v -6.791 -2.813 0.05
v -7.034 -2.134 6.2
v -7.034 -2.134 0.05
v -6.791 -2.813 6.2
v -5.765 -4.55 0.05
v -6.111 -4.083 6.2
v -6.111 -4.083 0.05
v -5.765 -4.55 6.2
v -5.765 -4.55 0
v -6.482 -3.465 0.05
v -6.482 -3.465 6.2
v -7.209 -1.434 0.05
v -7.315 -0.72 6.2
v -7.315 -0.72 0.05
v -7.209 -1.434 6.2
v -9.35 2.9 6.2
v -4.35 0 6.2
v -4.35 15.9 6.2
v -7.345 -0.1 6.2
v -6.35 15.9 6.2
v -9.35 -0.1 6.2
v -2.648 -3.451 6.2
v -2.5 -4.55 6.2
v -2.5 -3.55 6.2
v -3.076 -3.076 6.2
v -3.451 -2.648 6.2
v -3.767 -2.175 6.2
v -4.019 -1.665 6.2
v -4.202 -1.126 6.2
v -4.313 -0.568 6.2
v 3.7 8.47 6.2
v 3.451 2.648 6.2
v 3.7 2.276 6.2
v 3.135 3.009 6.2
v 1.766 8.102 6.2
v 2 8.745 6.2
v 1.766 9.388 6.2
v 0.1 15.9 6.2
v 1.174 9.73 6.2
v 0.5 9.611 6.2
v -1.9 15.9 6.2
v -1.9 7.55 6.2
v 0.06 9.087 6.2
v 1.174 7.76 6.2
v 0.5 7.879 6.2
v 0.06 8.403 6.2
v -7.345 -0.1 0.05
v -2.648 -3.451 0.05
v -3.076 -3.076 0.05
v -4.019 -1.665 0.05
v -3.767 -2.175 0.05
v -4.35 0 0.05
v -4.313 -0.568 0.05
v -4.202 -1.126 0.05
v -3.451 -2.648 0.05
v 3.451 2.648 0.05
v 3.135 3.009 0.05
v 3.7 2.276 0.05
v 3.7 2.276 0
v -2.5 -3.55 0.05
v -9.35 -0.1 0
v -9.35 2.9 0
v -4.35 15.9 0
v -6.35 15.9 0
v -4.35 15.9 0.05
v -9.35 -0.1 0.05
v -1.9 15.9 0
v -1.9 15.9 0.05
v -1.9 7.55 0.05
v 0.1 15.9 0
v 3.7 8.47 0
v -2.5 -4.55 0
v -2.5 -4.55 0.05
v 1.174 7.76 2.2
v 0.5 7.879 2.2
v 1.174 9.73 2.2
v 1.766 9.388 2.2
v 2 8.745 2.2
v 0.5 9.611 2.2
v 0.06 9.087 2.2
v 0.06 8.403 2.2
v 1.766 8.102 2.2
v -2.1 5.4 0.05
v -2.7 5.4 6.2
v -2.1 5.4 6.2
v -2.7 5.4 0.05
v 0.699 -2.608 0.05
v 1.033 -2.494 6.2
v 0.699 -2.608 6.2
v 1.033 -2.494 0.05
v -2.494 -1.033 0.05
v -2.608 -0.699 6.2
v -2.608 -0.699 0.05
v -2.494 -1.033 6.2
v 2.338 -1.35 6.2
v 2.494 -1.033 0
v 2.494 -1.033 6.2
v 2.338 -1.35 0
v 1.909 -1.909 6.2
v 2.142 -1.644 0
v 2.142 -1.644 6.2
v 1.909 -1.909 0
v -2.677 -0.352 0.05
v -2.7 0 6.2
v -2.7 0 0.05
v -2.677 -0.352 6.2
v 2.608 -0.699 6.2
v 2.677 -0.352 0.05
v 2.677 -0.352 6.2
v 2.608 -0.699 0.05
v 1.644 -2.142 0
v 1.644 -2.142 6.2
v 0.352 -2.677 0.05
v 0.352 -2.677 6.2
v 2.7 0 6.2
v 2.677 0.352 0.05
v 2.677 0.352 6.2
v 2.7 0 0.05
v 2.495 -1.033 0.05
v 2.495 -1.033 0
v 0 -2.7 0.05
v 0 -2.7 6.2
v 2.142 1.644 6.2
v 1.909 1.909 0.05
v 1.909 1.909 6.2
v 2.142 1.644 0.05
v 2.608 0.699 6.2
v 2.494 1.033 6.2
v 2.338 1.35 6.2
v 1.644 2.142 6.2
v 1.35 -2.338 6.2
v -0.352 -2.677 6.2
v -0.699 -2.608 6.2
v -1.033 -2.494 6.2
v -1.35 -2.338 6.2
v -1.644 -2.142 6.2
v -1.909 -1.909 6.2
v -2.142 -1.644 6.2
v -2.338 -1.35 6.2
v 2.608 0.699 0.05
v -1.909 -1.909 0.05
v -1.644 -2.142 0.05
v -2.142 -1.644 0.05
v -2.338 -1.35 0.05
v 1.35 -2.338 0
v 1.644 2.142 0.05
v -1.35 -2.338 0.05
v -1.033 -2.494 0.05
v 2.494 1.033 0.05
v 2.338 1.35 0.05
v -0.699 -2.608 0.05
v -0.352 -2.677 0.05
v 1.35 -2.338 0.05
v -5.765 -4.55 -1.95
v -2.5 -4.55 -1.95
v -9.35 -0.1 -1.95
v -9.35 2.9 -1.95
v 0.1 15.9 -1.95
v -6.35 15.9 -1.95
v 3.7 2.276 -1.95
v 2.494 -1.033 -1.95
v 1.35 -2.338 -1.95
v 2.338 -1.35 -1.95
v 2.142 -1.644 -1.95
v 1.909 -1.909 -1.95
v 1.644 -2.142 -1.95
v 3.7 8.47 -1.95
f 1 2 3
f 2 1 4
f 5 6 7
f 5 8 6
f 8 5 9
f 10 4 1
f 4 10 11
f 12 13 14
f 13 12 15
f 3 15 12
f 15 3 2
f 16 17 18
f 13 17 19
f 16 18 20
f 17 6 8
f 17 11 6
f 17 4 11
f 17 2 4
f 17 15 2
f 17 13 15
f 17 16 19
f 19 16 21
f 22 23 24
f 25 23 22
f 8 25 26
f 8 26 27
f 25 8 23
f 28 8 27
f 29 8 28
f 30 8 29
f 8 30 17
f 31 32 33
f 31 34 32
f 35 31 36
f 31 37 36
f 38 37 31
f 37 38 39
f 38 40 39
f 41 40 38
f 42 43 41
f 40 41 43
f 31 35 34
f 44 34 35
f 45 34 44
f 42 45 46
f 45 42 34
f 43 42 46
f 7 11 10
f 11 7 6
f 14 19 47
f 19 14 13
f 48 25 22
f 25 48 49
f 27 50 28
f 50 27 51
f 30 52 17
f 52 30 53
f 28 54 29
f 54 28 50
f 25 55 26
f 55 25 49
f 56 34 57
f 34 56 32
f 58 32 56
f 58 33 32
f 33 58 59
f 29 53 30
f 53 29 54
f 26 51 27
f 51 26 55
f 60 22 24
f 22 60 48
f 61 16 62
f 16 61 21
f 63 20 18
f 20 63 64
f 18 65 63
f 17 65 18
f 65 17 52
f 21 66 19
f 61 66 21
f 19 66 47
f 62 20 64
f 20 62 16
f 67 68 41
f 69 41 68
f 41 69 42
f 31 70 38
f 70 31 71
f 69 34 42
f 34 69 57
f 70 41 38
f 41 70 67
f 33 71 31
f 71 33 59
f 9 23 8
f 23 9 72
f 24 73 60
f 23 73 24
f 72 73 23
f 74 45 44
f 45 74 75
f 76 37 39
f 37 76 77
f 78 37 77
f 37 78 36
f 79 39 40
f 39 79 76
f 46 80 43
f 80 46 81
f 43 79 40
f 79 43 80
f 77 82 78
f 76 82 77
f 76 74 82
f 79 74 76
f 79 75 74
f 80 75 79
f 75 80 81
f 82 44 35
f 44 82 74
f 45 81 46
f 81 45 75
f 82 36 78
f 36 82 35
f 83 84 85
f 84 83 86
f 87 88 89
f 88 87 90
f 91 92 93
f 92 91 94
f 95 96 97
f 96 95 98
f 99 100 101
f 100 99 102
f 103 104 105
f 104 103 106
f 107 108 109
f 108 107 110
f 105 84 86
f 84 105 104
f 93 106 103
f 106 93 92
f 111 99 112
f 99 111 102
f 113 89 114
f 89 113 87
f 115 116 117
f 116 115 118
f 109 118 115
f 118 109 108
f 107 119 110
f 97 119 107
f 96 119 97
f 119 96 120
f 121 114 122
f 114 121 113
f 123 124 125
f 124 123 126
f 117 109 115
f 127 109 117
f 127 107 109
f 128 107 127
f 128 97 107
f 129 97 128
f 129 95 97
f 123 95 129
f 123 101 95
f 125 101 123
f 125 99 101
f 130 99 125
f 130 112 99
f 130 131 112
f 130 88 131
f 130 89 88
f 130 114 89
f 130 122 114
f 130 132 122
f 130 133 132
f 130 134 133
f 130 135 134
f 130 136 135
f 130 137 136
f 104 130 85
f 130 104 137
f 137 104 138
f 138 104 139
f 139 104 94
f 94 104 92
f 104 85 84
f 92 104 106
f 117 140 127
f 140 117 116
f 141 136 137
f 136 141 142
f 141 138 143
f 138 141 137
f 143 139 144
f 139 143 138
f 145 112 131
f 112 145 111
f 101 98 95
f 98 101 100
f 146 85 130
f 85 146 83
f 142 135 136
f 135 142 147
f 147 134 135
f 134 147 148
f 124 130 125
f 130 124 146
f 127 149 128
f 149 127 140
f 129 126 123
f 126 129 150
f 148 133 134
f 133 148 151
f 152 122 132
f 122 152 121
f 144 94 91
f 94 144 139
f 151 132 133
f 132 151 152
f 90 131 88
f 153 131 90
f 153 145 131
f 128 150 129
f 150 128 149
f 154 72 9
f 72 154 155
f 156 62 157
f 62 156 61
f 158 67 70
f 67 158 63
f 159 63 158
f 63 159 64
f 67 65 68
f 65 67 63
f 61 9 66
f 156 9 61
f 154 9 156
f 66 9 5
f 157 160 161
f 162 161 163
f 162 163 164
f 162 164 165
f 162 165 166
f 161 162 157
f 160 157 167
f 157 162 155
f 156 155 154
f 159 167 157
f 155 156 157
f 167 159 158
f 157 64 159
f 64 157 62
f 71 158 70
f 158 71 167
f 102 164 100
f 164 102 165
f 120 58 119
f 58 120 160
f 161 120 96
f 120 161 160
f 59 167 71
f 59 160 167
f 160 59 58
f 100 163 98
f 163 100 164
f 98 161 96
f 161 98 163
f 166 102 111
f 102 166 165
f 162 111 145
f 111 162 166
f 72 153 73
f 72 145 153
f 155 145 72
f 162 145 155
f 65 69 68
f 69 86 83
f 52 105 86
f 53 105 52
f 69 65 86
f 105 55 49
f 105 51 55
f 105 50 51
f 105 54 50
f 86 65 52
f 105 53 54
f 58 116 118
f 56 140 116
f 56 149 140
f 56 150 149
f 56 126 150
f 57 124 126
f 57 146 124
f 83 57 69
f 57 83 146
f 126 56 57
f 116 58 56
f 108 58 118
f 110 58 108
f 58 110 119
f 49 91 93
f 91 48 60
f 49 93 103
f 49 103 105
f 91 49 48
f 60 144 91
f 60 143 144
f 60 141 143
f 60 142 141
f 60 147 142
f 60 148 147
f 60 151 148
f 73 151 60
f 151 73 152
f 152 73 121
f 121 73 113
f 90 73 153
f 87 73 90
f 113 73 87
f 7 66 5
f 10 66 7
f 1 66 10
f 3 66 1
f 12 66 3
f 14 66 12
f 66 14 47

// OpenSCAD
beltThick  = 1.45 + 0.2;  // thickness of belt from back to tooth tip
// the doubled belt part must be very tight, or teeth will slip.
beltThick2 = 2.35 + 0.1;  // thickness of DOUBLED over belt, teeth interlocked

module beltCatch(height=6, full=false) union() {
    beltCatchMain(height,full);
    translate([0,0,-1.95]) linear_extrude(2) hull()
        projection(cut=false) beltCatchMain(1,full);
}

module beltCatchMain(height=6,full=false)
{
  postRad = 2.7;  // radius of main post
  // post is a little thin to safely support a screw.
  // move pilot screw hole to an outer brace
  //difference() {
    hull() {
      cylinder(h=height,r=postRad,$fn=48);
      translate([-postRad,0,0]) cube([0.6,2.0*postRad,height]);
    }
  //  translate([0,0,height-4]) cylinder(h=5,r=.6,$fn=11);  // pilot hole for optional lock-in screw
  //}

  difference() {
    union() {
      difference() {
        cylinder(h=height,r=postRad+beltThick+3,$fn=64);
        translate([0,0,-1]) cylinder(h=height+2,r=postRad+beltThick,$fn=48);
        translate([-10,0,-1]) cube([10,20,height+2]);
        translate([-10*.7071,10*.7071,-1]) rotate([0,0,-45]) cube([10,20,height+2]);
      }
      translate([-postRad-beltThick-3,-.1,0]) hull() {
        translate([-2, 0,0]) cube([5,3  ,height]);
        translate([ 1,15,0]) cube([2,1,height]);
      }
      hull() {
        translate([-postRad-beltThick+beltThick2, 2.0*postRad+beltThick+.5,0])
          cube([2,8.35,height]);
        rotate([0,0,43]) translate([postRad+beltThick,0,0]) cube([3,1,height]);
      }
    }

    // chop off (unnecessary) bottom curve part of catch
    translate([-12 ,-15,-2.1]) cube([24,15-postRad-beltThick-0.2,height+3]);
    translate([-2.5,-15,-2.1]) cube([ 5,15-postRad-0.2          ,height+3]);

    if (!full) {
      // chop off most of far brace for close quarters
      translate([postRad+1,-4,-2.1]) cube([10,20,height+3]);
      translate([-2,-7,-2.1]) rotate([0,0,-45]) cube([5,10,height+3]);
    }

    // pilot hole for optional lock-in screw
    translate([1,1.7*postRad+.7*beltThick+3,height-4])
      cylinder(h=5,r=1,$fn=9);

  }
}

union(){
  beltCatch(6.2);
  //translate([-6.4,-4.5,-2.5]) cube([10.1,20.4,2.7]);
}
%translate([0,-20,0]) mirror([0,1,0]) beltCatch(6,full=true);
%translate([-3,-8,3]) cube([2,60,6],center=true);
